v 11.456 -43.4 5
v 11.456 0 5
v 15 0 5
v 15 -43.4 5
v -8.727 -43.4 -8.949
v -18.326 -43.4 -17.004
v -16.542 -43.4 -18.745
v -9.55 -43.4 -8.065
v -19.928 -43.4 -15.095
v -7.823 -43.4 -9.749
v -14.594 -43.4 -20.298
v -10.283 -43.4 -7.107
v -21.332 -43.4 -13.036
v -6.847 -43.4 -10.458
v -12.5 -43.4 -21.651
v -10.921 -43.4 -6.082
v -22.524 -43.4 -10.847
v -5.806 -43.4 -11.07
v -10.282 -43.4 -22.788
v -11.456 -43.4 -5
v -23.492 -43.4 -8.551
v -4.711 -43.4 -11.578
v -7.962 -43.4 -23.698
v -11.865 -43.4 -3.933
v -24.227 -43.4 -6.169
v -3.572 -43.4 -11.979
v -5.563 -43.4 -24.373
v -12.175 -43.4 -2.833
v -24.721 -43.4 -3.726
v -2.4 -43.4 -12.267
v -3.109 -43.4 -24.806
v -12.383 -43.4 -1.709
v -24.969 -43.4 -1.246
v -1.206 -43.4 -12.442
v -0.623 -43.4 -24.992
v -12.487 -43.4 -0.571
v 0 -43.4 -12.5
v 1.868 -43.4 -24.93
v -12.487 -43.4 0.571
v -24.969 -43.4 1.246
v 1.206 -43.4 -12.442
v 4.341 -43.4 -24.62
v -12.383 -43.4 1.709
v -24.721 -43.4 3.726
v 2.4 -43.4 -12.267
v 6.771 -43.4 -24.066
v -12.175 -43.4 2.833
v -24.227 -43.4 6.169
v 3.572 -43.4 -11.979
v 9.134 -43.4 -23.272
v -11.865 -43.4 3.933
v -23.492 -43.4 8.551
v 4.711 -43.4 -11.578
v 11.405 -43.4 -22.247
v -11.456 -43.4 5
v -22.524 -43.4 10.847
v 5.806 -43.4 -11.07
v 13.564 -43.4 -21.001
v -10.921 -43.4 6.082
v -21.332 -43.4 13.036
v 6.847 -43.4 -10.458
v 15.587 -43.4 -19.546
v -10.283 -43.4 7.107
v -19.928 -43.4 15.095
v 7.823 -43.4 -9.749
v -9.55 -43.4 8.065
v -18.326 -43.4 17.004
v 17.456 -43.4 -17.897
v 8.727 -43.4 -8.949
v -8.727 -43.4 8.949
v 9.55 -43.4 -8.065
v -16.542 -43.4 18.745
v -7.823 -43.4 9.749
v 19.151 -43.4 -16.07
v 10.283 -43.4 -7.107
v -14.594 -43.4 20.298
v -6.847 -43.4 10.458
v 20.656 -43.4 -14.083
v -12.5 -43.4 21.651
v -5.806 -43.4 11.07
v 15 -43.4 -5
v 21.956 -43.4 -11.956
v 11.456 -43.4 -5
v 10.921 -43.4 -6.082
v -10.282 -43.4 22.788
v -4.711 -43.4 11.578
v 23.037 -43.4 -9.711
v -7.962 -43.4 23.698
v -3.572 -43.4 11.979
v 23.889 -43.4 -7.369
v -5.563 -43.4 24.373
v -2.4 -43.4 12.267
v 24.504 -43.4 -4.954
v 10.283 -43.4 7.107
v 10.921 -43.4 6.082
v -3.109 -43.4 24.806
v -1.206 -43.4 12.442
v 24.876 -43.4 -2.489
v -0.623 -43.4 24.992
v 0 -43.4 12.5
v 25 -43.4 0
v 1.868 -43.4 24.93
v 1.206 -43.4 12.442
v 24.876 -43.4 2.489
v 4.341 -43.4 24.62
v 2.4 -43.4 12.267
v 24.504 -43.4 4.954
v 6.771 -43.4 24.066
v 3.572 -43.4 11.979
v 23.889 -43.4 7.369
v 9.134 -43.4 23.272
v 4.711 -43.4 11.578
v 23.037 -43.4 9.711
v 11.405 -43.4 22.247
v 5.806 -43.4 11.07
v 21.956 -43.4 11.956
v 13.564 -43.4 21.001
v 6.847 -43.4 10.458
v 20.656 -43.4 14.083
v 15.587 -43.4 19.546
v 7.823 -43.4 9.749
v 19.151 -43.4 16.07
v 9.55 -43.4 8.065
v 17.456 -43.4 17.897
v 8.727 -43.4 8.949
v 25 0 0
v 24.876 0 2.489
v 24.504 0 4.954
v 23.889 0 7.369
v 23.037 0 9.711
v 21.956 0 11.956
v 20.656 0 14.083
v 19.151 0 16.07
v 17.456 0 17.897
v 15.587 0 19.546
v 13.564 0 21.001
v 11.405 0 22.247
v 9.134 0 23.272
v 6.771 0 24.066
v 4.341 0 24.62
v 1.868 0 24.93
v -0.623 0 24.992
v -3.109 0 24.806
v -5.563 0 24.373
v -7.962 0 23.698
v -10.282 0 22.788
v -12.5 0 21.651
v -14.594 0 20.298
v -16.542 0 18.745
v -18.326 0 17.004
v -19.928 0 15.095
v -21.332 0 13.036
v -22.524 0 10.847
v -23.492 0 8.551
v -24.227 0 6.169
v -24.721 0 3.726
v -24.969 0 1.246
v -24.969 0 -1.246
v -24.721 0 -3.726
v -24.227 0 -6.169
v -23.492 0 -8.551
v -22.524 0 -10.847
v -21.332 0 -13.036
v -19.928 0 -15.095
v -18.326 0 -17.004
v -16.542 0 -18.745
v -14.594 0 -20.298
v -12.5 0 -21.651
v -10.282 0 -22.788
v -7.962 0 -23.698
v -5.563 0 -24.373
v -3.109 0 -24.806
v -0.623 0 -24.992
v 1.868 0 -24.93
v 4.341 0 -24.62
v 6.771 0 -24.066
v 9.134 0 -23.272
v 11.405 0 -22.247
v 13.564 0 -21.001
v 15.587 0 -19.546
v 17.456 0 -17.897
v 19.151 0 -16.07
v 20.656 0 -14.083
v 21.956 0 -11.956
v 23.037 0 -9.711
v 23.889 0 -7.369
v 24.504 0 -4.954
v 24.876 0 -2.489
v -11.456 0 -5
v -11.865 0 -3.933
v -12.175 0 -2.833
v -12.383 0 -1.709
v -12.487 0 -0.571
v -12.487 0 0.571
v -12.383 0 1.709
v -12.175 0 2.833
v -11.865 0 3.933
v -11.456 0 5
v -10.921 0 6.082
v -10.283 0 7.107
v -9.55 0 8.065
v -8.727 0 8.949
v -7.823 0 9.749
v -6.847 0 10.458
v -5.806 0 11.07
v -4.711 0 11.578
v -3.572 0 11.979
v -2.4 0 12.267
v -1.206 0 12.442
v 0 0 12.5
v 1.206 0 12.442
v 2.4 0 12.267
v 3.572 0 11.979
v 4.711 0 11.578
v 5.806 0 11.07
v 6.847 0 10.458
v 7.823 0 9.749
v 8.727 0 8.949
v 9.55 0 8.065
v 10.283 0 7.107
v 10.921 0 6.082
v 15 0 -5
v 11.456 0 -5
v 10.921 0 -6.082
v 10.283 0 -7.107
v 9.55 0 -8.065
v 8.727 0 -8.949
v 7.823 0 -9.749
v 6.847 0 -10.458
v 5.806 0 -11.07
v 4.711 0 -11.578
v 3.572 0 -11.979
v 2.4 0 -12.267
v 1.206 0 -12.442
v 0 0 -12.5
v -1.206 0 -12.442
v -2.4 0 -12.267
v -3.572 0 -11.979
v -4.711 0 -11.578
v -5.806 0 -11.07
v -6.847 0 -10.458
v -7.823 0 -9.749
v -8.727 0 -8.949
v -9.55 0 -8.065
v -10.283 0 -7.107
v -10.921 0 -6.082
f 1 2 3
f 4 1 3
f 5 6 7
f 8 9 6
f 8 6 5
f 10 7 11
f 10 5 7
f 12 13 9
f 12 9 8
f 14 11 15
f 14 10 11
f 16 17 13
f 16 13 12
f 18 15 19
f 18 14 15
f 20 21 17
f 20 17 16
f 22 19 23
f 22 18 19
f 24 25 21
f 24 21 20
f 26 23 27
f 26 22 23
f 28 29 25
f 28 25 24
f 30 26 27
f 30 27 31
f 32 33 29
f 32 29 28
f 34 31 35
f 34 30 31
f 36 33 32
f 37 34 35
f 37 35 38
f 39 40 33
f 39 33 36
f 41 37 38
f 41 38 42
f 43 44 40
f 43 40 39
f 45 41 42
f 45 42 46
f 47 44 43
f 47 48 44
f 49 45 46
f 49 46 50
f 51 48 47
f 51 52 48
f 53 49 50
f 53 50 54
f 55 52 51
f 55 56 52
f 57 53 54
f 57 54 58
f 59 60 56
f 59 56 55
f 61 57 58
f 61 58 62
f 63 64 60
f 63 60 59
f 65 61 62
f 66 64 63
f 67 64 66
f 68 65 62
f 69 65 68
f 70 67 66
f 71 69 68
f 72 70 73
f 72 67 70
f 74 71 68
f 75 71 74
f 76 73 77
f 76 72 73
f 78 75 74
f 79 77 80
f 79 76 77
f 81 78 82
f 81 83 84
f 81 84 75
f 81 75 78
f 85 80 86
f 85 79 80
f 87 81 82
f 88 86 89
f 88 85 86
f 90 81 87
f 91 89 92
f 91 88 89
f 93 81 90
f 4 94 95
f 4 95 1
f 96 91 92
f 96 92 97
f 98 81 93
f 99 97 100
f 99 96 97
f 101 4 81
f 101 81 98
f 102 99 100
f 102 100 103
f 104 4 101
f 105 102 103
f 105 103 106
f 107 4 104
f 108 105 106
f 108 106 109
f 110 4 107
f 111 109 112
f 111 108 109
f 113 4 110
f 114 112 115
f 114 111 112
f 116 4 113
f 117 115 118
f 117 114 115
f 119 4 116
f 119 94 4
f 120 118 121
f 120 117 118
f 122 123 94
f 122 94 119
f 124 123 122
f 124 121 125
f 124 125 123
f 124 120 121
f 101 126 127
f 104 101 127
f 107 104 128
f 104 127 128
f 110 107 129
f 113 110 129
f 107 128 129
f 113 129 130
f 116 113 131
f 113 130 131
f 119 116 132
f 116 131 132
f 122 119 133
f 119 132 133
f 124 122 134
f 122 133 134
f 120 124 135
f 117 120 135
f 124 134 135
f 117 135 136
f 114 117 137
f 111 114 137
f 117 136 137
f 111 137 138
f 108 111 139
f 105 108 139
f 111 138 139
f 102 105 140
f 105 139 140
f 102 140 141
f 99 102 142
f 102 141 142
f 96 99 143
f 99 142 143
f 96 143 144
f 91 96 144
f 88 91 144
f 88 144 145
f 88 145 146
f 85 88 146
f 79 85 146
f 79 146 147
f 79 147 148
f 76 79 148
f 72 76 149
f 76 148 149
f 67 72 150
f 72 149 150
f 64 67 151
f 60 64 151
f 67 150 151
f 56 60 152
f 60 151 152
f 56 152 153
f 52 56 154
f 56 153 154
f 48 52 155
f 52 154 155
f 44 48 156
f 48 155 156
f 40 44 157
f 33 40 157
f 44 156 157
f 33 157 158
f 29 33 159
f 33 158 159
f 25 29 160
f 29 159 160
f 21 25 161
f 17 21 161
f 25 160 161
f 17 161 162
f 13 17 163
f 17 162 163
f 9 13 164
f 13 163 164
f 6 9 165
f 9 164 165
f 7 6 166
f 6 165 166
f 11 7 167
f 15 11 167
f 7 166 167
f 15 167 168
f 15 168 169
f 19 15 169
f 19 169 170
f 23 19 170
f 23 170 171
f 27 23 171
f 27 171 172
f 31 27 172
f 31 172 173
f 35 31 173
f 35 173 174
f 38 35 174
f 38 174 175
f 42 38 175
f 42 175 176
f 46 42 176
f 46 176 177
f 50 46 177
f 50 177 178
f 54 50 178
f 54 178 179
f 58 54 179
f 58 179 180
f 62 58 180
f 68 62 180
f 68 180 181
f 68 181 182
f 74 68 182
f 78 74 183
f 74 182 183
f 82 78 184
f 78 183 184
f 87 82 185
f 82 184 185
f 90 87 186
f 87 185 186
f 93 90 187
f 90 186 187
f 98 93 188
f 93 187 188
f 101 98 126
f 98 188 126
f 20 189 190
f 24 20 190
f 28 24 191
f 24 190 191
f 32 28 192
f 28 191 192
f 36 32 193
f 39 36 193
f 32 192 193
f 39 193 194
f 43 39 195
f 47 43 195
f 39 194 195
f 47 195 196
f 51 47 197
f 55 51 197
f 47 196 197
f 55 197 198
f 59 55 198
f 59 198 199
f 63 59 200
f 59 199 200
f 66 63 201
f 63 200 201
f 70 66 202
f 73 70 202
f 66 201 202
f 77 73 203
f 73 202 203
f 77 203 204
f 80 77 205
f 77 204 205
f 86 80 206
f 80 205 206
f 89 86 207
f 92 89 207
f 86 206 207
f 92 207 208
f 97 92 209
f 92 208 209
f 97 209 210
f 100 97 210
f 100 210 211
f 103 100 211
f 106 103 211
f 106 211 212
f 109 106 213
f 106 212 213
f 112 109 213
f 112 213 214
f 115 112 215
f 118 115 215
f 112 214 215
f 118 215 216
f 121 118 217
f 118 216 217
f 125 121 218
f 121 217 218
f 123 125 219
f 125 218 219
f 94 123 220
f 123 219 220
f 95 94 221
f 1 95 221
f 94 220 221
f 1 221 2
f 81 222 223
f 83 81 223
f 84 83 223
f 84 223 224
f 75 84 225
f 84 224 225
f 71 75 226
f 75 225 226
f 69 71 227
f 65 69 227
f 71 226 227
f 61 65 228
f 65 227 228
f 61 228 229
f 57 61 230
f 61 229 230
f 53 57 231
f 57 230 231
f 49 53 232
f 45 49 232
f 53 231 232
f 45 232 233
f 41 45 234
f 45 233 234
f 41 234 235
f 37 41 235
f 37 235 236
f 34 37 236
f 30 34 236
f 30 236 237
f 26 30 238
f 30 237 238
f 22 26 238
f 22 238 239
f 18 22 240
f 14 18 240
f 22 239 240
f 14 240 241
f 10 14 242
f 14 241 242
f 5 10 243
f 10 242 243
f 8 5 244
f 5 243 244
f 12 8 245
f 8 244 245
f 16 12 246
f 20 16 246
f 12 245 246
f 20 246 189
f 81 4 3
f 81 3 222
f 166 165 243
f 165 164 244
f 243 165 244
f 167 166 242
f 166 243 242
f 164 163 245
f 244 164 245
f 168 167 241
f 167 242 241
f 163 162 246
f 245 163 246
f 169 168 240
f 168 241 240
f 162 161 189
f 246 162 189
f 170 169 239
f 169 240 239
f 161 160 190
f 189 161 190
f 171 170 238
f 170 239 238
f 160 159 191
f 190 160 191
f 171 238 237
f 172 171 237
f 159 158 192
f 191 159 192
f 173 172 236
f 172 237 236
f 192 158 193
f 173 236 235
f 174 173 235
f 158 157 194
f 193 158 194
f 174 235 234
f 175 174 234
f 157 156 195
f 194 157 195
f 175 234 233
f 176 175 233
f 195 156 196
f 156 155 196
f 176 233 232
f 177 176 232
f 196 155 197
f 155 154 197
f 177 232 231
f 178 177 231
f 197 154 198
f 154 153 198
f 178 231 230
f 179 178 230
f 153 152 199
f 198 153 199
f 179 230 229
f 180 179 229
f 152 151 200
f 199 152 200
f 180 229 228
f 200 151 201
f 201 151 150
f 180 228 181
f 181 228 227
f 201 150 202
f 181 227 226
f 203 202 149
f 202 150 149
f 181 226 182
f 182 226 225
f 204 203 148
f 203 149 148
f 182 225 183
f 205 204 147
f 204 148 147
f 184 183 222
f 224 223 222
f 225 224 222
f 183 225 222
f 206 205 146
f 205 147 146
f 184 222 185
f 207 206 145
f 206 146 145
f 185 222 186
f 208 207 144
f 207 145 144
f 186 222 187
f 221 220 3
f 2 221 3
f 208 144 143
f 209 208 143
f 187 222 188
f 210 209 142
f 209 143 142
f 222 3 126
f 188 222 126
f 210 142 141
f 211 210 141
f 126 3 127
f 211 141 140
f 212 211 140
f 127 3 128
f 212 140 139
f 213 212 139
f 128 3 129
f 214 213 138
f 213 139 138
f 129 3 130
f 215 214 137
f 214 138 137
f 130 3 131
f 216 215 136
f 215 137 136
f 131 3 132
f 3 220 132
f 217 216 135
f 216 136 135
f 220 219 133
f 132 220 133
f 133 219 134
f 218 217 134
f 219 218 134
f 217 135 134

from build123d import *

# Parameters (mm, degrees)
F0_R     = 25
F1_DEPTH = 43.4


with BuildPart() as f1:
    # F0 (on Front) → F1 (new body)
    with BuildSketch(Plane.XZ):
        Circle(F0_R)
        with BuildLine():
            ThreePointArc((-11.4564392374, 5), (0, 12.5), (11.4564392374, 5))
            Line((11.4564392374, 5), (15, 5))
            Line((15, 5), (15, -5))
            Line((15, -5), (11.4564392374, -5))
            ThreePointArc((11.4564392374, -5), (0, -12.5), (-11.4564392374, -5))
            Line((-11.4564392374, -5), (-15, -5))
            Line((-15, -5), (-15, 5))
            Line((-15, 5), (-11.4564392374, 5))
        make_face(mode=Mode.SUBTRACT)
        with BuildLine():
            ThreePointArc((-11.4564392374, -5), (-12.5, 0), (-11.4564392374, 5))
            Line((-11.4564392374, 5), (-15, 5))
            Line((-15, 5), (-15, -5))
            Line((-15, -5), (-11.4564392374, -5))
        make_face()
    extrude(amount=F1_DEPTH)


solid = f1.part
